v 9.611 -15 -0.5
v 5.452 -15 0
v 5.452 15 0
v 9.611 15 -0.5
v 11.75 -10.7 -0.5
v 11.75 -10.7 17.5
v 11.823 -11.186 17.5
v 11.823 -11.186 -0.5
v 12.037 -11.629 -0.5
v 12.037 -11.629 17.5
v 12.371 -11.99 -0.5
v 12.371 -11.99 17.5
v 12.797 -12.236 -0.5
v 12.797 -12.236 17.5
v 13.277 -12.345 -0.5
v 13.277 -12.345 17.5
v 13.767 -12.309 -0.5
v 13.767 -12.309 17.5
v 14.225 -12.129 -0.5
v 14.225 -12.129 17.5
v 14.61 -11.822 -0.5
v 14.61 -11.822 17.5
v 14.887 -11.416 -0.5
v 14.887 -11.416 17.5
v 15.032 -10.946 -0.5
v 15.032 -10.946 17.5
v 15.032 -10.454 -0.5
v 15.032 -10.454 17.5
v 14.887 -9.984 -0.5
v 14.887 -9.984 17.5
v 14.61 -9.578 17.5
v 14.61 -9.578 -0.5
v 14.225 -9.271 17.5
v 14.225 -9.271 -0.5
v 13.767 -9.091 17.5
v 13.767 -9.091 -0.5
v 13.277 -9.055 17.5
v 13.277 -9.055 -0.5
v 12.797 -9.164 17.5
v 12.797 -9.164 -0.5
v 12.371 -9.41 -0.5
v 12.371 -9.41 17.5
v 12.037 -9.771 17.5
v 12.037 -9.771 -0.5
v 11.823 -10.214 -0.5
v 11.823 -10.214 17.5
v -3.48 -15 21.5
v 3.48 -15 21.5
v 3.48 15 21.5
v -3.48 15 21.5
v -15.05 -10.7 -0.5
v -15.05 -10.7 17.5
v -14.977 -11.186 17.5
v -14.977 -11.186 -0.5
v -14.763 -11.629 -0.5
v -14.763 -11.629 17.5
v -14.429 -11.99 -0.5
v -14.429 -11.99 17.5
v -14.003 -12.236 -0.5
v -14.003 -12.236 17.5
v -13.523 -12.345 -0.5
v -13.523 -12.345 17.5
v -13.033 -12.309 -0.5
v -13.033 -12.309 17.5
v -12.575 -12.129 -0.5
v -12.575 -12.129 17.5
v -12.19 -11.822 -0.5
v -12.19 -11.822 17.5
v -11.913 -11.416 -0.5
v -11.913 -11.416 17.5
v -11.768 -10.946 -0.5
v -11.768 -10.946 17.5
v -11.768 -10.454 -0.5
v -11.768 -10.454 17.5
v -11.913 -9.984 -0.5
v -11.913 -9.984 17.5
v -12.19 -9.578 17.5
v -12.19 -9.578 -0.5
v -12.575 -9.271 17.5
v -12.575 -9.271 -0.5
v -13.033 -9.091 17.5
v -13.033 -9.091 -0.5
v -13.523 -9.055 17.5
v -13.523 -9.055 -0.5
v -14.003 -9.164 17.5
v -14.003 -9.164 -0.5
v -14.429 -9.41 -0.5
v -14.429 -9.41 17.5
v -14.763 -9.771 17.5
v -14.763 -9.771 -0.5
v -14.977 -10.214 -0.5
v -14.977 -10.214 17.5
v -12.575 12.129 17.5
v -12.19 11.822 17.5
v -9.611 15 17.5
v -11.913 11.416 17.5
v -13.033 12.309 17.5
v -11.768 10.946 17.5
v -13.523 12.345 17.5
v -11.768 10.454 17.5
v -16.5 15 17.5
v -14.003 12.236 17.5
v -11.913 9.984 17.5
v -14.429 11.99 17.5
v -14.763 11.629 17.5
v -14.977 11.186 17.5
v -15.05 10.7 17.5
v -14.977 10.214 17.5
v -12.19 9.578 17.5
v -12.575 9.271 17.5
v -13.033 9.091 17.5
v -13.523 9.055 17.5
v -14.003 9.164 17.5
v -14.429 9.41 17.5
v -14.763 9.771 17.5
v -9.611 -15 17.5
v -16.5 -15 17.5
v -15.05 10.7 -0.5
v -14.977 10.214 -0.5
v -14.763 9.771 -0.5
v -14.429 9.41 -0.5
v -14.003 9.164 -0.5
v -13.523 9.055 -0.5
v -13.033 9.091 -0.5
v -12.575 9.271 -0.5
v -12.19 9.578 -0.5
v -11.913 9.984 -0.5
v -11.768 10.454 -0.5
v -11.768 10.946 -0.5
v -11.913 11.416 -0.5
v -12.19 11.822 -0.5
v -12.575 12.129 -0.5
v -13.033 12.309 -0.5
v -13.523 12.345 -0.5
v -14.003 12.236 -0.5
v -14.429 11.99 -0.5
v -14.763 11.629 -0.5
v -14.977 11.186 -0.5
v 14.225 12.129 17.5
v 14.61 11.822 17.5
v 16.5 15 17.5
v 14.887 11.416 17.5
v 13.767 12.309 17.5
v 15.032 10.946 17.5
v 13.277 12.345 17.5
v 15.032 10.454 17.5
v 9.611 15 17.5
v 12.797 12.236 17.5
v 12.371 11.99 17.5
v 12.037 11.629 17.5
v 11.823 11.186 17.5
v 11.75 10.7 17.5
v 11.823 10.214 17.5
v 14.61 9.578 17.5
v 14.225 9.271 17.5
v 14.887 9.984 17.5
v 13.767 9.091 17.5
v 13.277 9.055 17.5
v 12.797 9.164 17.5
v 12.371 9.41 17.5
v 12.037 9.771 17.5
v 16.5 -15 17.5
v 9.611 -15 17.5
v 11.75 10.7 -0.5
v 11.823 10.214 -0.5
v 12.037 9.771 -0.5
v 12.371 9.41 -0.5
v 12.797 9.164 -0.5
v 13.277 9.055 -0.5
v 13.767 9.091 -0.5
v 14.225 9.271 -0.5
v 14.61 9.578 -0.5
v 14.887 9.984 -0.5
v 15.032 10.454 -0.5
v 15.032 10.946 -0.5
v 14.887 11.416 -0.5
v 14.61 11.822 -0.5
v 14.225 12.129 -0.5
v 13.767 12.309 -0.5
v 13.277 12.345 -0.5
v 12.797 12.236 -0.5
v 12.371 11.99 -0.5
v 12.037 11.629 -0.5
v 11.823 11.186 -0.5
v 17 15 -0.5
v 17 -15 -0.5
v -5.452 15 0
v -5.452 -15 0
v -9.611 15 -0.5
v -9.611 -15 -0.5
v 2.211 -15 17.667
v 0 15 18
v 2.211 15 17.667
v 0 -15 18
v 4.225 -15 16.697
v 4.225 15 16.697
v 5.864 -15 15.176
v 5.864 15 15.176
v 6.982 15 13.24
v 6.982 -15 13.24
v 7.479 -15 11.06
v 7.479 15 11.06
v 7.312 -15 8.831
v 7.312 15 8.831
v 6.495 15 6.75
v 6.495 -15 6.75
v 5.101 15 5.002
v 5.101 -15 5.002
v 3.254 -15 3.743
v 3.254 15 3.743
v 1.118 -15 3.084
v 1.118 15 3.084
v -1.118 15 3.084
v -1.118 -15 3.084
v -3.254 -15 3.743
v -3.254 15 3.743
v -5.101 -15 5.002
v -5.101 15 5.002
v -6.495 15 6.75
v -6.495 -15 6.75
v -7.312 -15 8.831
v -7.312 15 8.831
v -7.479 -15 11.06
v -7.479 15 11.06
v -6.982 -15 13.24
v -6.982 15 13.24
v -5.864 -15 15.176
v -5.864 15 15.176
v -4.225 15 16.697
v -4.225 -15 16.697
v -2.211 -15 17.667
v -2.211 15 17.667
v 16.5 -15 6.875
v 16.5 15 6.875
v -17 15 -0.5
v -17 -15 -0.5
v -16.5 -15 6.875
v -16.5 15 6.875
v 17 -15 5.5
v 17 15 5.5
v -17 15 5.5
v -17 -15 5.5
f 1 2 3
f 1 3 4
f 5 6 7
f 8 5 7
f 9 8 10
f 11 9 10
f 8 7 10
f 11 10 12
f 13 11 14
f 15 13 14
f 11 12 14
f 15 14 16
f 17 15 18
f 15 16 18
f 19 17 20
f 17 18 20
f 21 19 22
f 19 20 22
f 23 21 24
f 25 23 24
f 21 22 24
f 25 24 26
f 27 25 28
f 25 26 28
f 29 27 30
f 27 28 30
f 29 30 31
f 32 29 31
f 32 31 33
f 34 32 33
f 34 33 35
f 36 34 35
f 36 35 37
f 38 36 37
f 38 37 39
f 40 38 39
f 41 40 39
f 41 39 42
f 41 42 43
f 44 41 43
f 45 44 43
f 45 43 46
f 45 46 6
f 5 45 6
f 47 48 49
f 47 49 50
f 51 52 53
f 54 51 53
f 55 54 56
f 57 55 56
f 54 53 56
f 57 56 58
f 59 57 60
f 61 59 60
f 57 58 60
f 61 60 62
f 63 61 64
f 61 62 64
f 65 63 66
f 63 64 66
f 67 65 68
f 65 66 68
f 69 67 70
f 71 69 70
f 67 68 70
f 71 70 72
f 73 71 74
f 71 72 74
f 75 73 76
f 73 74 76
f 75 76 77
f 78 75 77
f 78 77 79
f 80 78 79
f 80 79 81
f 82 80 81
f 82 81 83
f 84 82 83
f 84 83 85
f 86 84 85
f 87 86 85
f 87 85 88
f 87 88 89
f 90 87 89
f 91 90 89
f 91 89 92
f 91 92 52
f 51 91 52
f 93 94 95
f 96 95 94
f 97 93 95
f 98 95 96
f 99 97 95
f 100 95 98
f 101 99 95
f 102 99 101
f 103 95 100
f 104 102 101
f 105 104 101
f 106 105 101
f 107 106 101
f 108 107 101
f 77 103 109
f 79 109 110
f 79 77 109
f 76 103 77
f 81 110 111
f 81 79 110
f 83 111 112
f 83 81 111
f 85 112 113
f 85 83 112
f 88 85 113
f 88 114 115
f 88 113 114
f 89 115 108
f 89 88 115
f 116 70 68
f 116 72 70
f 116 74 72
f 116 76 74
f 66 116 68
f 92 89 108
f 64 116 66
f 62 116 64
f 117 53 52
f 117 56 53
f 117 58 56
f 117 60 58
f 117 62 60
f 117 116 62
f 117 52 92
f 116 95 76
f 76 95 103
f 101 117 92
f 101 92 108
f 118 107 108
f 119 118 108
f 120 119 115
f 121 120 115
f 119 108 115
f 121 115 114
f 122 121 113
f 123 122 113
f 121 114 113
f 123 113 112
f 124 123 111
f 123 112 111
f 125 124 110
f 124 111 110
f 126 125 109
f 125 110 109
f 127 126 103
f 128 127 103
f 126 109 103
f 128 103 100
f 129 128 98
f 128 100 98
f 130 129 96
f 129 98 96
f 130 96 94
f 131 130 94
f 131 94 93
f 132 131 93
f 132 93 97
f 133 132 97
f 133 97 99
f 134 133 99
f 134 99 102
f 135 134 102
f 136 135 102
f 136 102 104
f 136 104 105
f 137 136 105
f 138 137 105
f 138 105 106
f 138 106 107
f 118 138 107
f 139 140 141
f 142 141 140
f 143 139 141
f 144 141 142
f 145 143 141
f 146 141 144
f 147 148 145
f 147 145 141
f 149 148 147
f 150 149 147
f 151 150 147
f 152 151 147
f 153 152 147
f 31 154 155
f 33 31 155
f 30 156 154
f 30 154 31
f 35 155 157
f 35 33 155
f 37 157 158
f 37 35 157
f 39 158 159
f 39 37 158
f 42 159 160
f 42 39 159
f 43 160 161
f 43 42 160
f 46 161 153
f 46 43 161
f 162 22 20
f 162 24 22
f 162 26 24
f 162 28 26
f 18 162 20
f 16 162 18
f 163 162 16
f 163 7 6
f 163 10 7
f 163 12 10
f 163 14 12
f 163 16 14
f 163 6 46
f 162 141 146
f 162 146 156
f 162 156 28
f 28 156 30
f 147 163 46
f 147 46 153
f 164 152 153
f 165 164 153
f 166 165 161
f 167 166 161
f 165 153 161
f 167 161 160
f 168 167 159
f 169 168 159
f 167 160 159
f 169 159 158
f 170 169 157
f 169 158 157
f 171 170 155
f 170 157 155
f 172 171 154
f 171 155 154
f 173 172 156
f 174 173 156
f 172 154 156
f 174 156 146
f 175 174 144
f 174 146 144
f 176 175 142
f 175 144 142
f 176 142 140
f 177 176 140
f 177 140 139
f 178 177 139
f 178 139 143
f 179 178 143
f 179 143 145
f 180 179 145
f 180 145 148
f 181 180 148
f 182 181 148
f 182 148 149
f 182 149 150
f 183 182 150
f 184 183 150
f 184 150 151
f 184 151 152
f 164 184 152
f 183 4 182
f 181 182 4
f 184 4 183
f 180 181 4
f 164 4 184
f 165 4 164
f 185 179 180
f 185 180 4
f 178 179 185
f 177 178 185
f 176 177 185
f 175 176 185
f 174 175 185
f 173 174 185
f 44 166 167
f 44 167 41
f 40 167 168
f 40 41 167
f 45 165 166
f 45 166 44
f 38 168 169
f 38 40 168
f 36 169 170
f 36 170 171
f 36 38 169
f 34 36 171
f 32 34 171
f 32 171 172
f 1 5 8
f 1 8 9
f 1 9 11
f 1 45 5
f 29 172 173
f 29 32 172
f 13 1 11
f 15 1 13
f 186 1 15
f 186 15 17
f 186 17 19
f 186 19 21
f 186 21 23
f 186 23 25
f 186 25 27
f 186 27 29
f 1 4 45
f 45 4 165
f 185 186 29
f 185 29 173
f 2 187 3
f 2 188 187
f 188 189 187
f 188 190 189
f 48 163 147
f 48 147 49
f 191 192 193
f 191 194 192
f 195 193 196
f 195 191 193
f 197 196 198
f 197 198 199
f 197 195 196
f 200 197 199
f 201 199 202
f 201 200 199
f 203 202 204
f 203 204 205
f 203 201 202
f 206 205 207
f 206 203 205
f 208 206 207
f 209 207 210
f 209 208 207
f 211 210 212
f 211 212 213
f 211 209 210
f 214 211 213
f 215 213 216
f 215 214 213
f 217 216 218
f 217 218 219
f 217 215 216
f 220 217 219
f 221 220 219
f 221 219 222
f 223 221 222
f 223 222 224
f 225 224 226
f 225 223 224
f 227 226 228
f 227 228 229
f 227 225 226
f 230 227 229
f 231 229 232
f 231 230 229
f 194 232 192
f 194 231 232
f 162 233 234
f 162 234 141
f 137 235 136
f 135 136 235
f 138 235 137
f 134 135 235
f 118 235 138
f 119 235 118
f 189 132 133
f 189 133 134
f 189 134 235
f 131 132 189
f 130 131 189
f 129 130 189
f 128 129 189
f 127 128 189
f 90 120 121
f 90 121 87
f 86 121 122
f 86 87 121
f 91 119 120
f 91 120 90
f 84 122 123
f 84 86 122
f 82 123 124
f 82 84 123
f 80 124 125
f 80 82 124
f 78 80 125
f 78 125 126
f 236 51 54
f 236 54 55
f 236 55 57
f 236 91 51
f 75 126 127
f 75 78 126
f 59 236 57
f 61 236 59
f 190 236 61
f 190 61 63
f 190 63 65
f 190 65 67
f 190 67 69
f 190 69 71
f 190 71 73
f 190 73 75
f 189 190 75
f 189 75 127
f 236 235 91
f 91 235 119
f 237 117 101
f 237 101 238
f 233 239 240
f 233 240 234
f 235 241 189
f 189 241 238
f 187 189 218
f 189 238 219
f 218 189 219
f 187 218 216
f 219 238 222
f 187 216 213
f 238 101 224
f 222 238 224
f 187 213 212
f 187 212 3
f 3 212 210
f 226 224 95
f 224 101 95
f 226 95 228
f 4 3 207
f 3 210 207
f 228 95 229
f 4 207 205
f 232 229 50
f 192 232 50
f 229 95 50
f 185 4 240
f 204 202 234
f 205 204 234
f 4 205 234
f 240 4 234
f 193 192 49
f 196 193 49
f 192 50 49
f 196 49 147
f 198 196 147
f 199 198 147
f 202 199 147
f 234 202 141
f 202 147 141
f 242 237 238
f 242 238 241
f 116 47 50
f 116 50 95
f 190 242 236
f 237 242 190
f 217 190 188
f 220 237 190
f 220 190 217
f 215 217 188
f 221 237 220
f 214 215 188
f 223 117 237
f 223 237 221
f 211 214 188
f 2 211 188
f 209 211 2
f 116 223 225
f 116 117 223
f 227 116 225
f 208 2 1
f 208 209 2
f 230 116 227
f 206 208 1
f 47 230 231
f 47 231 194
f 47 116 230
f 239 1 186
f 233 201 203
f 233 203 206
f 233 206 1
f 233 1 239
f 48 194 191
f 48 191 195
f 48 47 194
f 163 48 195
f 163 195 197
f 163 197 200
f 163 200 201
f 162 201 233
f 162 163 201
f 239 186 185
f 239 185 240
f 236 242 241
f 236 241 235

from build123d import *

# Parameters (mm, degrees)
F1_DEPTH = 15
F3_D     = 3.3


with BuildPart() as f1:
    # F0 (on Front) → F1 (new body, symmetric)
    with BuildSketch(Plane.XZ):
        with BuildLine():
            Line((-5.4519269615, 0), (0, 0))
            Line((0, 0), (0, 3))
            ThreePointArc((0, 3), (-7.5, 10.5), (0, 18))
            Line((0, 18), (0, 21.5))
            Line((0, 21.5), (-3.4802674782, 21.5))
            Line((-3.4802674782, 21.5), (-9.6111802198, 17.5))
            Line((-9.6111802198, 17.5), (-16.5, 17.5))
            Line((-16.5, 17.5), (-16.5, 6.8754809164))
            Line((-16.5, 6.8754809164), (-17, 5.5))
            Line((-17, 5.5), (-17, -0.5))
            Line((-17, -0.5), (-9.6111802198, -0.5))
            Line((-9.6111802198, -0.5), (-5.4519269615, 0))
        make_face()
        with BuildLine():
            Line((0, 3), (0, 0))
            Line((0, 0), (5.4519269615, 0))
            Line((5.4519269615, 0), (9.6111802198, -0.5))
            Line((9.6111802198, -0.5), (17, -0.5))
            Line((17, -0.5), (17, 5.5))
            Line((17, 5.5), (16.5, 6.8754809164))
            Line((16.5, 6.8754809164), (16.5, 17.5))
            Line((16.5, 17.5), (9.6111802198, 17.5))
            Line((9.6111802198, 17.5), (3.4802674782, 21.5))
            Line((3.4802674782, 21.5), (0, 21.5))
            Line((0, 21.5), (0, 18))
            ThreePointArc((0, 18), (7.5, 10.5), (0, 3))
        make_face()
    extrude(amount=F1_DEPTH, both=True)

    # F3 (through all)
    with Locations(Plane(origin=(0, 0, -0.5), x_dir=(1, 0, 0), z_dir=(0, 0, -1))):
        with Locations((-13.4, 10.7), (-13.4, -10.7), (13.4, -10.7), (13.4, 10.7)):
            Hole(F3_D / 2)


solid = f1.part
